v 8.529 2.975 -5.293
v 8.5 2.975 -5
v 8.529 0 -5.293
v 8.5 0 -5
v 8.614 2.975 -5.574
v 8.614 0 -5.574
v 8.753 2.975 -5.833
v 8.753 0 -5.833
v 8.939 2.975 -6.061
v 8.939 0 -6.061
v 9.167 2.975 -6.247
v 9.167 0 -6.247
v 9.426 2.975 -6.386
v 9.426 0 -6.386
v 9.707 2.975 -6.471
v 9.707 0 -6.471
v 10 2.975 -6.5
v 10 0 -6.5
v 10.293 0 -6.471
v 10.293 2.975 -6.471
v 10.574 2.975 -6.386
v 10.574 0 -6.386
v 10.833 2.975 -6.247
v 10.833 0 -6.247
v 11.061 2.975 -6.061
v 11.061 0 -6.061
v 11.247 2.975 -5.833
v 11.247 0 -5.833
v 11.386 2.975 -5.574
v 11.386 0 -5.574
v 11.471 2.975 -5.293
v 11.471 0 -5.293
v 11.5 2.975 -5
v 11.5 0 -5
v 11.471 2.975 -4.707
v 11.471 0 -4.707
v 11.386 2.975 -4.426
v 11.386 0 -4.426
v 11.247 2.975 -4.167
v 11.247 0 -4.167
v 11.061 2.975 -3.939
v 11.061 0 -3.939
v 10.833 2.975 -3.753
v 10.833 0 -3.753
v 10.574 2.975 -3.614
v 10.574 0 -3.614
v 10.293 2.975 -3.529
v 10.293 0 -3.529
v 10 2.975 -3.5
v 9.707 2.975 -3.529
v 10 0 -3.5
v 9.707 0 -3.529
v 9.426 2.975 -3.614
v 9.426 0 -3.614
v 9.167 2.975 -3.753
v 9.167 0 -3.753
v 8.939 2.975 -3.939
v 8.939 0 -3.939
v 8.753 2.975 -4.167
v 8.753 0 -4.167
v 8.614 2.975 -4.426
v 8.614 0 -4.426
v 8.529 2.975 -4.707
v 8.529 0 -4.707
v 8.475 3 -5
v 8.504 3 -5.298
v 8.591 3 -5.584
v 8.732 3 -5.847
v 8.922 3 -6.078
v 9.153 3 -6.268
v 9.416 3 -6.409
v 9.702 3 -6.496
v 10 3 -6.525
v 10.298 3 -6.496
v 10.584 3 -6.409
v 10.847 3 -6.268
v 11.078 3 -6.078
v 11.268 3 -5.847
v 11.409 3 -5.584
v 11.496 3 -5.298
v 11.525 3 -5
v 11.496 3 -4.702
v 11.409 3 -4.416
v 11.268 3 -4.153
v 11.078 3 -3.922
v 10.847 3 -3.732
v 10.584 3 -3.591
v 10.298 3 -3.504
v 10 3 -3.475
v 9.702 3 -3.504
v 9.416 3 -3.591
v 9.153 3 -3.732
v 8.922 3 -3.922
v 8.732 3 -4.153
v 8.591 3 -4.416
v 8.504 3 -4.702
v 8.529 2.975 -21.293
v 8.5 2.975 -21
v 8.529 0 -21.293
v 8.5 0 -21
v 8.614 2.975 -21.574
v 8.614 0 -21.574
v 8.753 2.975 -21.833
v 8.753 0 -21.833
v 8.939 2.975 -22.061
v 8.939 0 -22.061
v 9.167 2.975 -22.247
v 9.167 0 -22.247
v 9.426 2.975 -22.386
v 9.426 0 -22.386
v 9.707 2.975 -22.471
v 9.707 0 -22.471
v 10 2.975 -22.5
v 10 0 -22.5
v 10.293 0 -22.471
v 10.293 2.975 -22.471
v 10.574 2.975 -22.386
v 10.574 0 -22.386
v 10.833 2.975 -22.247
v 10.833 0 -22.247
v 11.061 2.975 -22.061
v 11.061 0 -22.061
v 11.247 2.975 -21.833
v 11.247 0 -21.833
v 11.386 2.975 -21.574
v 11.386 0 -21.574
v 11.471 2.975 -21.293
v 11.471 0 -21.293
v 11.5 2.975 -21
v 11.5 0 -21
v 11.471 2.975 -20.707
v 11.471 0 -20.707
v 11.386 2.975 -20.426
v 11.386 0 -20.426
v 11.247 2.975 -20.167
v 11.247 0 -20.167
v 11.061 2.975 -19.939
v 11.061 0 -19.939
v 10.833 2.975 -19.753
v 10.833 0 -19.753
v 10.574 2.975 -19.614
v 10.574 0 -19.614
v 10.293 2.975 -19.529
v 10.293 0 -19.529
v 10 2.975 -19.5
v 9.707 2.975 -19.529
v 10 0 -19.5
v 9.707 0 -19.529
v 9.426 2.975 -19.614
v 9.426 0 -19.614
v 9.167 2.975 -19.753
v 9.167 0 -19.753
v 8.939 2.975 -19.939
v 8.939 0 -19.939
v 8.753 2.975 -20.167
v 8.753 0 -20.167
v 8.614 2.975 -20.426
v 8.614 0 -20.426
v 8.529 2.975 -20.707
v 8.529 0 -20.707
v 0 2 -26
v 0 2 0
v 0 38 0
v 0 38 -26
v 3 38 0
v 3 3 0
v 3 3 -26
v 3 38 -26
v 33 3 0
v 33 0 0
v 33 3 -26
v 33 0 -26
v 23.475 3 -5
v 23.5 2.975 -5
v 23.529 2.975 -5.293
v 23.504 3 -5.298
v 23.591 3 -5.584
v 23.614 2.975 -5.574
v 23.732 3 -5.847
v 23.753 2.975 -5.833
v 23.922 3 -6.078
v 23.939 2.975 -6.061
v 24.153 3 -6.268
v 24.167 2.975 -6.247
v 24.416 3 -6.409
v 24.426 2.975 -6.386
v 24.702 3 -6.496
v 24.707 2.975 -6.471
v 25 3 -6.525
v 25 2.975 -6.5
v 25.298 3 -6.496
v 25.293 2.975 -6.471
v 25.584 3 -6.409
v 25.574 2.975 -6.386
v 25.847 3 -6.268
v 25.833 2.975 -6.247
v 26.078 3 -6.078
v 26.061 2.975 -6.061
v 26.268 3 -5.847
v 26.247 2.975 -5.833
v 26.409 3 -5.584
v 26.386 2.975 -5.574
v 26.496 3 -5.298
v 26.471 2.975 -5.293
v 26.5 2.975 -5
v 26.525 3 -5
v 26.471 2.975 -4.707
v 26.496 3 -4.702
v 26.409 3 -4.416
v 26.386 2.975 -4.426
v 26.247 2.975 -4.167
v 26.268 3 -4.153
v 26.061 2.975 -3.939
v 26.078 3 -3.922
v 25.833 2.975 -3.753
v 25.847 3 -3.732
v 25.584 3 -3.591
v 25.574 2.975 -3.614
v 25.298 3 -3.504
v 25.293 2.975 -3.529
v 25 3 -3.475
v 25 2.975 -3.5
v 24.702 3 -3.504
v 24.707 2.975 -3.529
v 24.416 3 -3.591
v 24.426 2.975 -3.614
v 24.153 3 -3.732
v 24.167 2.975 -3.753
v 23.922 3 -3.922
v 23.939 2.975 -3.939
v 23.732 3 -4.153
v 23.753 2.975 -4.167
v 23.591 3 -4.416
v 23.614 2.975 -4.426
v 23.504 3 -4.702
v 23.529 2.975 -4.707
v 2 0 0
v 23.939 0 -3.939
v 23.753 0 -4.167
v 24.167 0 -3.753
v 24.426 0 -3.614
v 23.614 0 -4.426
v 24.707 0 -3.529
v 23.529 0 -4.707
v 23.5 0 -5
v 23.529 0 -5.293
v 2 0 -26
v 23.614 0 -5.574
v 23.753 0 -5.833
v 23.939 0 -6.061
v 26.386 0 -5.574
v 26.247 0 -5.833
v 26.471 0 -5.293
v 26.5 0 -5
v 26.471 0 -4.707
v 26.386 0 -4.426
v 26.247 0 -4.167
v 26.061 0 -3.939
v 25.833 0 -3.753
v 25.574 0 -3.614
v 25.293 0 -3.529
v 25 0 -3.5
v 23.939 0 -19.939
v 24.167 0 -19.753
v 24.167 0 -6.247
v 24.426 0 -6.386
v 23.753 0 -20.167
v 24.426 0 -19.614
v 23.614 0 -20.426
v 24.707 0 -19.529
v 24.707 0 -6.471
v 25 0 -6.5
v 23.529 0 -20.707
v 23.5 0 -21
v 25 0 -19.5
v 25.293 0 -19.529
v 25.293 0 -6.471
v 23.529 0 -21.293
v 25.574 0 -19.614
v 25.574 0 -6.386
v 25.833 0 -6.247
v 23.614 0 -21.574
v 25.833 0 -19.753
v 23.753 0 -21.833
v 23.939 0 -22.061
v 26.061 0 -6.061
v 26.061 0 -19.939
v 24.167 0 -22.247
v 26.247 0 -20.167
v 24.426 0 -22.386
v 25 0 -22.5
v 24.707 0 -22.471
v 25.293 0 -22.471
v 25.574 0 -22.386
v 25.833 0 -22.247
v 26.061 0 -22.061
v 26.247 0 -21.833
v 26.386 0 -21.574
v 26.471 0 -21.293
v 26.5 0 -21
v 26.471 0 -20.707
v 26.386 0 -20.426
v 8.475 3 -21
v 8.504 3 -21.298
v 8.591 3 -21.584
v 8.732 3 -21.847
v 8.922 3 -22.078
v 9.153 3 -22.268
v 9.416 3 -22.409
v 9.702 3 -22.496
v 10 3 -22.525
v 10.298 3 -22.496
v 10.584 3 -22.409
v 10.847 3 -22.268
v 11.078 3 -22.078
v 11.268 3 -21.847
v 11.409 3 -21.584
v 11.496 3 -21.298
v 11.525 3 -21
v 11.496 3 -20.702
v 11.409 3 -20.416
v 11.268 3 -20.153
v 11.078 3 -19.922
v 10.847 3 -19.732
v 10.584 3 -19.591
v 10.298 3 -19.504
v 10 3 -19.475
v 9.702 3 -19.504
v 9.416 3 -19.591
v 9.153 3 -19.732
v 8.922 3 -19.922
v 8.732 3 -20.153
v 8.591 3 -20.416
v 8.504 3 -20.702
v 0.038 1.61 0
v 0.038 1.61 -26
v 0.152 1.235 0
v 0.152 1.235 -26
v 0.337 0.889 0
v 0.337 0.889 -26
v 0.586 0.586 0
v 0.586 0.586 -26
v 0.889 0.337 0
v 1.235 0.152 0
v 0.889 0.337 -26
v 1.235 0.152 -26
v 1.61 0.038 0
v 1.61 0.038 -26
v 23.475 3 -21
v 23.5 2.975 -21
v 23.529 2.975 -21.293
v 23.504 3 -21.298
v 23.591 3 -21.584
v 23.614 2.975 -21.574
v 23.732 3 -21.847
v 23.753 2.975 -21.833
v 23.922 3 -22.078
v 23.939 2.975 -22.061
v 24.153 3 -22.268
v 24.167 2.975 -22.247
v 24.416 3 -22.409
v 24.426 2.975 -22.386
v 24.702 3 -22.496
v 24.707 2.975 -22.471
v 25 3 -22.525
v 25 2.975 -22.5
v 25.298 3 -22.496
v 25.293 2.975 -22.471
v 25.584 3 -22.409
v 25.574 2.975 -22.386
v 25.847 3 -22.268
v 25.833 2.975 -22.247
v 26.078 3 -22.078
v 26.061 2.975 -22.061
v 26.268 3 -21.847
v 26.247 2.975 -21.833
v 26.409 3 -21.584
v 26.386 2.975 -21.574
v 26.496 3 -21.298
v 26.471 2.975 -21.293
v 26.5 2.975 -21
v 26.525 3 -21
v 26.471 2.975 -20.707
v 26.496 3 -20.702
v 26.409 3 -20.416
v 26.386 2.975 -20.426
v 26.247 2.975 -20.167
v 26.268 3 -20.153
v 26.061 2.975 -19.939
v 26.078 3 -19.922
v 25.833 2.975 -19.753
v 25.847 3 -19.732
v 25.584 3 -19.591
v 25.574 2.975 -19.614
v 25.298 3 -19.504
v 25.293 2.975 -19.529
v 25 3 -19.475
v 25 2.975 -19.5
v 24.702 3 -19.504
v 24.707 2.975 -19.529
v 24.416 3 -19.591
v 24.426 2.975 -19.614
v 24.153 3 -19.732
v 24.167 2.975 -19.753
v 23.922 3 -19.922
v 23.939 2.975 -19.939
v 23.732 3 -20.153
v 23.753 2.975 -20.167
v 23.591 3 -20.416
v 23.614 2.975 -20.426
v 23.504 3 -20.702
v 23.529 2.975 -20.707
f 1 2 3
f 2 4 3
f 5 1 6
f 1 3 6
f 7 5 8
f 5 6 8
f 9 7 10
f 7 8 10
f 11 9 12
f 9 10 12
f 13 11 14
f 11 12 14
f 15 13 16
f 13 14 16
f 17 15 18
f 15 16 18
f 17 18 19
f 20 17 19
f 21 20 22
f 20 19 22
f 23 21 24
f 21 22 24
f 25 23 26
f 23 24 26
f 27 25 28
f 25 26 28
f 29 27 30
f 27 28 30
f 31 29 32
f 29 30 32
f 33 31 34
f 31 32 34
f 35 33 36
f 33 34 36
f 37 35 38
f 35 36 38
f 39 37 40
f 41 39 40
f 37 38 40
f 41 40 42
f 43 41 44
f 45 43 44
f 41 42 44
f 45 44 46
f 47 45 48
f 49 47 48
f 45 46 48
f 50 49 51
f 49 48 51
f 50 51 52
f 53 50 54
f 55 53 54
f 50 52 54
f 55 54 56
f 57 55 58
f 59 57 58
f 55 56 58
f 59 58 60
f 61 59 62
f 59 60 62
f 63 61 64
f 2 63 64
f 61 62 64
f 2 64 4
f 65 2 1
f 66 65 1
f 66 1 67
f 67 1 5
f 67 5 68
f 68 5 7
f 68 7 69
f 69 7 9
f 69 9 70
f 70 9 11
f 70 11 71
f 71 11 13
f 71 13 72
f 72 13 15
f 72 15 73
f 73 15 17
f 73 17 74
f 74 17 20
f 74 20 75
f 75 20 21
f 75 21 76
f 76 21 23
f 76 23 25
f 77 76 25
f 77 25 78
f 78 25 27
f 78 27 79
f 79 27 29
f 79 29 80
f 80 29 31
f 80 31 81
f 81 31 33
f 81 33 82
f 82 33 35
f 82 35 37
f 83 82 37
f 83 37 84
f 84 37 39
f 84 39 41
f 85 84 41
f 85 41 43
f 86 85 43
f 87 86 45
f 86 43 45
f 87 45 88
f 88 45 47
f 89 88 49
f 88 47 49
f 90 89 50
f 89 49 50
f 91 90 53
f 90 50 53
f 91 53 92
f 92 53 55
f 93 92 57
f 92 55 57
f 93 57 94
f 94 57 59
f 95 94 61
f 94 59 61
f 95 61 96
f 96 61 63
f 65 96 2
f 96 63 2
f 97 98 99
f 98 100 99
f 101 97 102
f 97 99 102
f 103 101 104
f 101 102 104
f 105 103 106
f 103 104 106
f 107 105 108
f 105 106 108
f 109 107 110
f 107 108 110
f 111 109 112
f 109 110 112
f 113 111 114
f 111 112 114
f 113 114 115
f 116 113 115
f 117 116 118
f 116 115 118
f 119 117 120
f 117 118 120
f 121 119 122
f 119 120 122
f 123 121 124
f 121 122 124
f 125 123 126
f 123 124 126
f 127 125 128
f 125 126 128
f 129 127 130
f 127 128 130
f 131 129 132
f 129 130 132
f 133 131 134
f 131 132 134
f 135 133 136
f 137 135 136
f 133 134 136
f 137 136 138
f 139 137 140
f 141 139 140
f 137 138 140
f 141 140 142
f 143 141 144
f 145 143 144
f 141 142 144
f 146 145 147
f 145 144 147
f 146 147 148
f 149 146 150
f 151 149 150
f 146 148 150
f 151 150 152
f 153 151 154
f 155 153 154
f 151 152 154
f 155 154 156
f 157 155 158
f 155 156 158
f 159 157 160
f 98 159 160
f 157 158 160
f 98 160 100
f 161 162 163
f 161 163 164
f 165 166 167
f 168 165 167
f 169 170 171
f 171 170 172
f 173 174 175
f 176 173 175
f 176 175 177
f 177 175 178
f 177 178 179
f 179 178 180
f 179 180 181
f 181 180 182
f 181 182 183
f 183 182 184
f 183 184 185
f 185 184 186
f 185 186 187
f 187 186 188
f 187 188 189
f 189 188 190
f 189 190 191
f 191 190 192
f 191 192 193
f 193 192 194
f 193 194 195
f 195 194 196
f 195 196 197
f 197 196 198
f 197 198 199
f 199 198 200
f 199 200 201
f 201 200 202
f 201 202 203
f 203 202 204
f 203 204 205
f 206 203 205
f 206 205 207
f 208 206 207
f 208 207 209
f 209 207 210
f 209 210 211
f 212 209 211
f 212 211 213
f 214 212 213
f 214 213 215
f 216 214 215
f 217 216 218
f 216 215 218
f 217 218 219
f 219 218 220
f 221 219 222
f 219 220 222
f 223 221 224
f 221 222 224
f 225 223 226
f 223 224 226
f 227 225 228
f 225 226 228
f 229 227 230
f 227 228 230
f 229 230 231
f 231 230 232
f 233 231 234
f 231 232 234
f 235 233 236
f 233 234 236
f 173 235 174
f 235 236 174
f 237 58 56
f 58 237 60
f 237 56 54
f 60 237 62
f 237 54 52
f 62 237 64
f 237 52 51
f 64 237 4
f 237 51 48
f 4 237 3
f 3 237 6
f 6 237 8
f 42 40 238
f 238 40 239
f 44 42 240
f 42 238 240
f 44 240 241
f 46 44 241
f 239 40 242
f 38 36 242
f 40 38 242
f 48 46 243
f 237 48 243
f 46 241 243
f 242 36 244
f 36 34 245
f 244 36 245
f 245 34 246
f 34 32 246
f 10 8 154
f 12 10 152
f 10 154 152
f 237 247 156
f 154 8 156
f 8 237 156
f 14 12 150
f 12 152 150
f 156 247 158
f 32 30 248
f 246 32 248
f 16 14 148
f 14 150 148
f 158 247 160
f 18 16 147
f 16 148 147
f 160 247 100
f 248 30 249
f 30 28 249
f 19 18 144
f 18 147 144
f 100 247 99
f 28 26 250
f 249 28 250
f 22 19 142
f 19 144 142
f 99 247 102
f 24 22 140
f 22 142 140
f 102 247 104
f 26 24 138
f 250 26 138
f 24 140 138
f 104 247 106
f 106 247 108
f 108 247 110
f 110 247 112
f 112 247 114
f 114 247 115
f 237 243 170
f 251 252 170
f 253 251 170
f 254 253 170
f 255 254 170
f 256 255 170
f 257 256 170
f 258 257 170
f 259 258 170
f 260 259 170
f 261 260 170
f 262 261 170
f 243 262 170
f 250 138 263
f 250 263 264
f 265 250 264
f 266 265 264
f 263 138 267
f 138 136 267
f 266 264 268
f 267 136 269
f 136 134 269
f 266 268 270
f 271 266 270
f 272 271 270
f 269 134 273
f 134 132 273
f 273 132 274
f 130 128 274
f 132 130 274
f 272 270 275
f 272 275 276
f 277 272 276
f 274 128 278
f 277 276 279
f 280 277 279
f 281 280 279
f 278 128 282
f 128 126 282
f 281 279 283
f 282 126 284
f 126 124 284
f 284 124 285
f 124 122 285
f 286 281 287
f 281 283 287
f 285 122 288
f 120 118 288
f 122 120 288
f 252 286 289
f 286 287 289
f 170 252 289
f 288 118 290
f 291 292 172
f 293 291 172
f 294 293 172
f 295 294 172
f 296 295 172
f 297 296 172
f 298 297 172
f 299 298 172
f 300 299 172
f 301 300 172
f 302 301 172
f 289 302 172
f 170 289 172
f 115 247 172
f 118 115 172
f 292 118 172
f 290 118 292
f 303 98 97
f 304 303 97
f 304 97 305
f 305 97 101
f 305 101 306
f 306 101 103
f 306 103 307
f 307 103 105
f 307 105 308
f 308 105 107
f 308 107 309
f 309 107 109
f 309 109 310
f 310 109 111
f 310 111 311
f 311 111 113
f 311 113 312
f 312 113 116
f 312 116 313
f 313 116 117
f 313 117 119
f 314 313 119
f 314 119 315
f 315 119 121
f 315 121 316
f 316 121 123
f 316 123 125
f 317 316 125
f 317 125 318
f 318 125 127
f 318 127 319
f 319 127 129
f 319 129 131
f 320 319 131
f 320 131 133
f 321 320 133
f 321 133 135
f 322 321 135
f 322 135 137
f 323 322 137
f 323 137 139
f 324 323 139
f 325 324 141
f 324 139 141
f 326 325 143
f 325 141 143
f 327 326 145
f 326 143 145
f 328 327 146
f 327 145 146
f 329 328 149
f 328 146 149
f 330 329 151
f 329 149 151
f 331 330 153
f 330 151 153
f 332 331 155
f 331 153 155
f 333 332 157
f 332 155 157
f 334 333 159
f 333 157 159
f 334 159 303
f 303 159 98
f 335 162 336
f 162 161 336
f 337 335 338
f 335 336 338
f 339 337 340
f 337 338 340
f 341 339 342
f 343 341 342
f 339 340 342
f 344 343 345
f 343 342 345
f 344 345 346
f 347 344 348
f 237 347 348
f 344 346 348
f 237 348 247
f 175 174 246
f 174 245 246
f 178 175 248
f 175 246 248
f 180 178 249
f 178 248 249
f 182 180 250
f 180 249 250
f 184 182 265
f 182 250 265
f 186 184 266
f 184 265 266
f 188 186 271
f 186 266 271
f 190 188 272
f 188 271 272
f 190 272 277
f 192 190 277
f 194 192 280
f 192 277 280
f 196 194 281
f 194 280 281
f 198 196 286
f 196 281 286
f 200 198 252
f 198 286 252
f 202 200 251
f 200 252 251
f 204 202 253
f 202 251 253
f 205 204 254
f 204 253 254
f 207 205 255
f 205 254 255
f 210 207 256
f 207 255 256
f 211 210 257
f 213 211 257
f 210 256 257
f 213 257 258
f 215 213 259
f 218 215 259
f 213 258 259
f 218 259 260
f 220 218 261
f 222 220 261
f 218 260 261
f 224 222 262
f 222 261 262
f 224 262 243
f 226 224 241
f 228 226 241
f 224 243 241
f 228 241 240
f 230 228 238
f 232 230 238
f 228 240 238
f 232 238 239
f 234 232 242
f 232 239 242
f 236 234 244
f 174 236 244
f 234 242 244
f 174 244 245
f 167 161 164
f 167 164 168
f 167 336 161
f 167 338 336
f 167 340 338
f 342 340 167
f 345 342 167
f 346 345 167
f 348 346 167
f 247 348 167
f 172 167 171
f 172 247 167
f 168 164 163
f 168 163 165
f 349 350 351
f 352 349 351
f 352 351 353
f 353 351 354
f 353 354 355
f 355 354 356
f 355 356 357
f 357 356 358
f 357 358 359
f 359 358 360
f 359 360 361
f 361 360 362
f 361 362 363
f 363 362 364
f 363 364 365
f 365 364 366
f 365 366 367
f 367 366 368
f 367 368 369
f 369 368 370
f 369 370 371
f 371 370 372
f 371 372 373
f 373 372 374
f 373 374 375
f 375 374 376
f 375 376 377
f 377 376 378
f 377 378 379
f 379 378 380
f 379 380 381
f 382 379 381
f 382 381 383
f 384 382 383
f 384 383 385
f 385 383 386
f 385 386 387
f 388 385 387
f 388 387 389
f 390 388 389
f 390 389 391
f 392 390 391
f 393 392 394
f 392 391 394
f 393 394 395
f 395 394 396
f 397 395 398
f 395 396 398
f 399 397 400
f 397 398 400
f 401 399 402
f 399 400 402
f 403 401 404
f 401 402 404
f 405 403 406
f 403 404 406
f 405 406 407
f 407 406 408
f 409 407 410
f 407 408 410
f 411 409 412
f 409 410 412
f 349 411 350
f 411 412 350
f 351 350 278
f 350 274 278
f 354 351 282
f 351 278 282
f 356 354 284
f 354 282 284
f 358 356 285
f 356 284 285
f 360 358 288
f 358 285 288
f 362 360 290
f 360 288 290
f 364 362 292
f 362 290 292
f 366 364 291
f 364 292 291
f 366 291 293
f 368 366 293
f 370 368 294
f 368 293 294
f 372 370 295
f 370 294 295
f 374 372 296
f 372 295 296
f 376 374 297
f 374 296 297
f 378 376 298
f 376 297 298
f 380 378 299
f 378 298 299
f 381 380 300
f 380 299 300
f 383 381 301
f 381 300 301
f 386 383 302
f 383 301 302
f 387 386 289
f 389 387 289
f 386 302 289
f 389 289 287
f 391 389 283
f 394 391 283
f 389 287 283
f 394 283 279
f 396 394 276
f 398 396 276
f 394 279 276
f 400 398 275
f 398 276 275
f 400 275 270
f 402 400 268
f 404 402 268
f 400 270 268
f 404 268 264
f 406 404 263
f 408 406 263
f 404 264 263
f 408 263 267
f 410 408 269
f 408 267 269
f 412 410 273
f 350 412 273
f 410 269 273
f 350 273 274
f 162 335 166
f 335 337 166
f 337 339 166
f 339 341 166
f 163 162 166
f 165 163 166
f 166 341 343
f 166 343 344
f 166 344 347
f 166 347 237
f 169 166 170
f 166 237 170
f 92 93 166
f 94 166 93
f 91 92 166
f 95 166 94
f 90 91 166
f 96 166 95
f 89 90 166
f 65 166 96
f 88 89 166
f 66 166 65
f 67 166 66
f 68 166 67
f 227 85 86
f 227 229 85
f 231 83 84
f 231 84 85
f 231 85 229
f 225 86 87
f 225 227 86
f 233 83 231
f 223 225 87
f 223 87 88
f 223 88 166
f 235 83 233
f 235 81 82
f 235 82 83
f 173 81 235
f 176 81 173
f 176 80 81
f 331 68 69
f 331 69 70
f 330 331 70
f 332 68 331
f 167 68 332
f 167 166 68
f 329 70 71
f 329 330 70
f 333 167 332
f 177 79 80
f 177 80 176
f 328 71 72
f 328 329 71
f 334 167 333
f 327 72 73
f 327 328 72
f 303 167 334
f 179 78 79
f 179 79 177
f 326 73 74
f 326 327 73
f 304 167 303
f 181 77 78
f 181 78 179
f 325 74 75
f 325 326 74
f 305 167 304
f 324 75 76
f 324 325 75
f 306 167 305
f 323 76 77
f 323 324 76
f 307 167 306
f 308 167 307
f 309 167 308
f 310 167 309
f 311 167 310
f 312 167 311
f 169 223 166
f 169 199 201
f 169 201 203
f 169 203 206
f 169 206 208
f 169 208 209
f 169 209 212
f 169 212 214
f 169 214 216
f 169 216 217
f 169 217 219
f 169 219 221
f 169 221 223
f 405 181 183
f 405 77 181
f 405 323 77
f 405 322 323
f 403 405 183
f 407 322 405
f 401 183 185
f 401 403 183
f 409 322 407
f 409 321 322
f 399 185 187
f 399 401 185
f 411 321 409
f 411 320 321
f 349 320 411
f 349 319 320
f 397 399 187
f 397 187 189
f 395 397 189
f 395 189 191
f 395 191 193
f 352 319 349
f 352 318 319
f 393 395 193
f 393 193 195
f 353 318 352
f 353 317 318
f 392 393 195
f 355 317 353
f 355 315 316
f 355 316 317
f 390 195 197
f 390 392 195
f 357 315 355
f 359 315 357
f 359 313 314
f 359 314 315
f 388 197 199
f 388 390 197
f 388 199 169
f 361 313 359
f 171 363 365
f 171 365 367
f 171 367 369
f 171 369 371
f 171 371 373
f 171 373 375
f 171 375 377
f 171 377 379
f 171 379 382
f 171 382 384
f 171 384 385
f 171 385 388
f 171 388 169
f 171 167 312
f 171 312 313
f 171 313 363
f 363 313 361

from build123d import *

# Parameters (mm, degrees)
SKETCH1_W                       = 33
SKETCH1_H                       = 26
BOSS_EXTRUDE1_DEPTH             = 3
SKETCH2_W                       = 3
SKETCH2_H                       = 26
BOSS_EXTRUDE2_DEPTH             = 35
FILLET1_R                       = 2
F_3_0MM_DOWEL_HOLE1_D           = 3
F_3_0MM_DOWEL_HOLE1_CSINK_D     = 3.05
F_3_0MM_DOWEL_HOLE1_CSINK_ANGLE = 90


with BuildPart() as part:
    # Sketch1 → Boss-Extrude1 (new body)
    with BuildSketch(Plane(origin=(0, 0, 0), x_dir=(1, 0, 0), z_dir=(0, 1, 0))):
        with Locations((16.5, 13)):
            Rectangle(SKETCH1_W, SKETCH1_H)
    extrude(amount=BOSS_EXTRUDE1_DEPTH)

    # Sketch2 → Boss-Extrude2 (add)
    with BuildSketch(Plane(origin=(0, 3, 0), x_dir=(1, 0, 0), z_dir=(0, 1, 0))):
        with Locations((1.5, 13)):
            Rectangle(SKETCH2_W, SKETCH2_H)
    extrude(amount=BOSS_EXTRUDE2_DEPTH)

    # Fillet1
    fillet1_edges = [part.edges().sort_by_distance(p)[0] for p in [
        (0, 0, -13),
    ]]
    fillet(fillet1_edges, radius=FILLET1_R)

    # Ø3.0mm Dowel Hole1 (through all)
    with Locations(Plane(origin=(0, 3, 0), x_dir=(1, 0, 0), z_dir=(0, 1, 0))):
        with Locations((25, 21), (10, 21), (25, 5), (10, 5)):
            CounterSinkHole(F_3_0MM_DOWEL_HOLE1_D / 2, F_3_0MM_DOWEL_HOLE1_CSINK_D / 2, counter_sink_angle=F_3_0MM_DOWEL_HOLE1_CSINK_ANGLE)


solid = part.part
